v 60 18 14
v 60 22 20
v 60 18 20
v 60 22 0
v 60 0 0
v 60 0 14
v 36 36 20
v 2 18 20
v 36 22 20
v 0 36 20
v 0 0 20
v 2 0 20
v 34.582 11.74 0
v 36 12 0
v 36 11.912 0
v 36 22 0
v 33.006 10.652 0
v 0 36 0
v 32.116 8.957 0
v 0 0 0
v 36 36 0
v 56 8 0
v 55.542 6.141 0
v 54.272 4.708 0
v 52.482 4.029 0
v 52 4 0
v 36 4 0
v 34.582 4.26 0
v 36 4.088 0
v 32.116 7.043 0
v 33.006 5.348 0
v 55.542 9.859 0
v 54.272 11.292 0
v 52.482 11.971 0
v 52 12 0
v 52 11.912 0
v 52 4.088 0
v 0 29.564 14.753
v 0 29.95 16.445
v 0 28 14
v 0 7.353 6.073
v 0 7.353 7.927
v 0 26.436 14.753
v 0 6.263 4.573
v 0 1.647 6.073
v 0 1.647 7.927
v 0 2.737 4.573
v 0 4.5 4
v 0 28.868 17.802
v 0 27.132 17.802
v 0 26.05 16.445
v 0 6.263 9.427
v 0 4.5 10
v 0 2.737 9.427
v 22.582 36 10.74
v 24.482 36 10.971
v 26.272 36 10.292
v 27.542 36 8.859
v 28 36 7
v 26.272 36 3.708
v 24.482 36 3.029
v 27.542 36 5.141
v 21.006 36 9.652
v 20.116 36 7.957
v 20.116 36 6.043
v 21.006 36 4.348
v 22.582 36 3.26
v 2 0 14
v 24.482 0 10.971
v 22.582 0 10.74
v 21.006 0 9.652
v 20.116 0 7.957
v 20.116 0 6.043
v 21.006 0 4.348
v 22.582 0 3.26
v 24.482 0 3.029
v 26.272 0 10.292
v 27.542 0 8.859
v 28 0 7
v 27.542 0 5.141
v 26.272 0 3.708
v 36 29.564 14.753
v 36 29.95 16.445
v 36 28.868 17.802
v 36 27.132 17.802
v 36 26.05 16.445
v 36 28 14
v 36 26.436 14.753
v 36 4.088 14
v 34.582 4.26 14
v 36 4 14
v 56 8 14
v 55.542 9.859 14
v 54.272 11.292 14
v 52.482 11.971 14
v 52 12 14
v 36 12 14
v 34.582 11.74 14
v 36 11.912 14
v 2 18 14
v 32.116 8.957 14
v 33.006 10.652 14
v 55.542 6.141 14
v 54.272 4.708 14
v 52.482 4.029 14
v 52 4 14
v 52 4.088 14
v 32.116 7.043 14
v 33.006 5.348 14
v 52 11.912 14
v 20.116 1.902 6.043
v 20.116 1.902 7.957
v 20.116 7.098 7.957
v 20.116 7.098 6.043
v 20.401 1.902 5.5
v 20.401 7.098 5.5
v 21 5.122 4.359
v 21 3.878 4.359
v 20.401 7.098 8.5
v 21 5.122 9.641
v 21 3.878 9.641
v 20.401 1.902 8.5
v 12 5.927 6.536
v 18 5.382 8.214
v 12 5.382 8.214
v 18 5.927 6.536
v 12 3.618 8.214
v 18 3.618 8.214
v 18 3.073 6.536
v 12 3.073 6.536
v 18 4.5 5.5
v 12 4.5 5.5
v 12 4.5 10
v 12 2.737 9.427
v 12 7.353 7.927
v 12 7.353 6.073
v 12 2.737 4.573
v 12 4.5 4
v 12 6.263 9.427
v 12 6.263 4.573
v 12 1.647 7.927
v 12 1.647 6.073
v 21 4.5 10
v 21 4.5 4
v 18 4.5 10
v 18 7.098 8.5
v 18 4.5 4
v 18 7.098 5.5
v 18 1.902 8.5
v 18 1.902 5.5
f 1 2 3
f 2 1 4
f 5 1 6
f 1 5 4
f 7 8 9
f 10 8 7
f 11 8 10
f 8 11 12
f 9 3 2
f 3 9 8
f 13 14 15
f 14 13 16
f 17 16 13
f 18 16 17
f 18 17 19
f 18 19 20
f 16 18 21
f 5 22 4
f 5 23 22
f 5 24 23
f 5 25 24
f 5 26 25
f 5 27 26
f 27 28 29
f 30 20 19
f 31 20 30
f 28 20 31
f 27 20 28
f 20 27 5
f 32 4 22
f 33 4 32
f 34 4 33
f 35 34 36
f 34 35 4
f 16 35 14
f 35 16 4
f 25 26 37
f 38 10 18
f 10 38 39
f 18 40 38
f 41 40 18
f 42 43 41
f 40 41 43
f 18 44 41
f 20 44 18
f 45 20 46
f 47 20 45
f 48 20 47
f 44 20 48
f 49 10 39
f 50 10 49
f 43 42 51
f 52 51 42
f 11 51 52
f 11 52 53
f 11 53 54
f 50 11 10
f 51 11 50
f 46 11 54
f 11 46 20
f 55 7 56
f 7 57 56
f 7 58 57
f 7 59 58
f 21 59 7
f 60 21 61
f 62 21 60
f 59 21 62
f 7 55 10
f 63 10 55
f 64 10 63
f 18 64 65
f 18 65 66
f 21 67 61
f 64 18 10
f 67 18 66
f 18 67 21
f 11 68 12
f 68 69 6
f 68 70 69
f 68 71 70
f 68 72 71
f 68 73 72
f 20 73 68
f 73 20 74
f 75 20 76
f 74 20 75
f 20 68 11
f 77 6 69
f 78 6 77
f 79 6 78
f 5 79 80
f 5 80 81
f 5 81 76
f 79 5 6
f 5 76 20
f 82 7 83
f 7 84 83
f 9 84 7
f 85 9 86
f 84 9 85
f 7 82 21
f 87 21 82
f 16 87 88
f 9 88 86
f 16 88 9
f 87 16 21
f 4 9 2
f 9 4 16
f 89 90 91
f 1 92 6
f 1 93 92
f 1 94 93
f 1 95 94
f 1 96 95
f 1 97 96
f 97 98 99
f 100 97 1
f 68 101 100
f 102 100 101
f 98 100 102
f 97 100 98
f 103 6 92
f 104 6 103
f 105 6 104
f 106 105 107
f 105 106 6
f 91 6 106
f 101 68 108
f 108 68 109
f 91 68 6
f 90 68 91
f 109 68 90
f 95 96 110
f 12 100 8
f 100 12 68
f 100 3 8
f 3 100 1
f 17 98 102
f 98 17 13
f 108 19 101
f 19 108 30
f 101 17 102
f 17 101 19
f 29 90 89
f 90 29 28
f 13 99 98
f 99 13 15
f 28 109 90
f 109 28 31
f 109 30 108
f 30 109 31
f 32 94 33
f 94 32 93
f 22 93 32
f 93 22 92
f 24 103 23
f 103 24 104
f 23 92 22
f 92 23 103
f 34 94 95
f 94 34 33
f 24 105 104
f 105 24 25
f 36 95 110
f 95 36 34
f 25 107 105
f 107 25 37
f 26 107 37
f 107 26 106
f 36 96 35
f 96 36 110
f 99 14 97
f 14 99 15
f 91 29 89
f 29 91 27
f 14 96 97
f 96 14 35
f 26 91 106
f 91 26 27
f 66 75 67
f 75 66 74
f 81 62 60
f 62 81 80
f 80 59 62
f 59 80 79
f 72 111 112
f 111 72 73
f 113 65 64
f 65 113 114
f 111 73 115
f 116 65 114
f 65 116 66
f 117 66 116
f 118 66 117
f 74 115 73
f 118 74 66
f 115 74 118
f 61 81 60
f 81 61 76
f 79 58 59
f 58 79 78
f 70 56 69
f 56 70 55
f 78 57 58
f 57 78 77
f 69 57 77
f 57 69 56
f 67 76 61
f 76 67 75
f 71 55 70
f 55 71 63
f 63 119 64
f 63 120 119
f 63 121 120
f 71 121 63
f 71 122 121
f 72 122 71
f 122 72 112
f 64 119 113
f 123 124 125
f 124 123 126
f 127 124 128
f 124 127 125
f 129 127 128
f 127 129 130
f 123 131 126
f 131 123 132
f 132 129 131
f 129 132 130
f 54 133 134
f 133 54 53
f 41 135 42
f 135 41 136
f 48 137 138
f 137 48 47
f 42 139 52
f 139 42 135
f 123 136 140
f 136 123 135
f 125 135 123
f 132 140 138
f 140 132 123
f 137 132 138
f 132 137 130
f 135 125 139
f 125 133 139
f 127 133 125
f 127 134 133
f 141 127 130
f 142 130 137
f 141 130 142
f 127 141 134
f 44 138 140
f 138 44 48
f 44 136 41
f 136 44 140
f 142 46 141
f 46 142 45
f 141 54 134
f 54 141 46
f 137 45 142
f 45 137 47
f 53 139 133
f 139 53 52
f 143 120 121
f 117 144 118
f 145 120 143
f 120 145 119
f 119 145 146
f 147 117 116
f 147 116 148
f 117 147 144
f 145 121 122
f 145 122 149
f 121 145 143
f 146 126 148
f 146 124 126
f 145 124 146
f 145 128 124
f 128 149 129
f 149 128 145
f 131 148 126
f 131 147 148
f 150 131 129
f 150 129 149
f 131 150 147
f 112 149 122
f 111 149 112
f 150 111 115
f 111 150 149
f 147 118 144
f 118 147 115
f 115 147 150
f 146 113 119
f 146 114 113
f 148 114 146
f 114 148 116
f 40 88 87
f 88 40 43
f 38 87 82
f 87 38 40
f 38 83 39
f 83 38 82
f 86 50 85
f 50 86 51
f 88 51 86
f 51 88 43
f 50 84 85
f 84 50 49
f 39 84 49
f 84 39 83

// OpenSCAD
// file: configuration.scad
// Copyright (C) 2012 t00tie
// Adapto is licensed under the Creative Commons - GNU GPL license.
// http://creativecommons.org/licenses/GPL/2.0/

// Configuration file for Adapto OpenSCAD files

boltOuterRadius=5/2;// outer radius of bolt threads, 5 for M5 bolts
boltLength=60;//bolt length without head (threaded part only)
washerOuterRadius=13/2;// washers that fit the bolts
washerLength=10;// this is large because it is used to make holes for washers

frameX=20;// width of frame parts (alu, wood etc.)
frameY=20;// ditto

boltOffset=frameX/2;// How far in the bolt holes go, may need tweaking if framX!=frameY

smoothRod=8;// diameter of smooth rods
// file: bolt.scad
include <configuration.scad>;

module bolt(){
	union(){
		translate([0, 0, -boltLength]) cylinder(r=boltOuterRadius, h=boltLength+1);
		cylinder(r=washerOuterRadius, h=washerLength);
	}
}

// a bolt and washer intended for making equivalent holes
// the parameter from indicates which side the bolt is inserted from
module boltWasher(from="x-"){
	if(from=="x+"){
		rotate([0, 90, 0]) bolt();
	} else
	if(from=="x-"){
		rotate([0, -90, 0]) bolt();
	} else
	if(from=="y+"){
		rotate([-90, 0, 0]) bolt();
	} else
	if(from=="y-"){
		rotate([90, 0, 0]) bolt();
	} else
	if(from=="z+"){
		rotate([0, 0, 0]) bolt();
	} else
	if(from=="z-"){
		rotate([180, 0, 0]) bolt();
	}
}

boltWasher("x-");
// main file
// Copyright (C) 2012 t00tie
// After an stl designed by RoTorIT
// Adapto is licensed under the Creative Commons - GNU GPL license.
// http://creativecommons.org/licenses/GPL/2.0/

use <bolt.scad>;
include <configuration.scad>;

length=60;
lowerHeight=14;
thinWidth=22;
shortLength=36;
height=20;
width=36;
wallWidth=2;
bhBolt=8;// width of the bearing holder bolt elongated hole
srXoffset=20;// smooth rod X offset
srZoffset=3;// smooth rod Z offset
srSetScrew=3;// diameter of the smooth rod set screw
sSHead=6;// set screw head diameter
sSHH=12;// set screw head height
cHole=4;// X carriage fastener hole diameter
cHXoffset=26;// X carriage fastener hole X offset
cHZoffset=14;// X carriage fastener hole Z offset

difference(){
	// main body
	cube([length, width, height]);
	translate([shortLength, thinWidth, -1]) cube([length+2, width+2, height+2]);
	translate([wallWidth, -1,lowerHeight]) cube([length+2, thinWidth-wallWidth-1, height]);
	// bearing holder hole
	translate([shortLength, bhBolt, -1]) cylinder(r=bhBolt/2, h=lowerHeight+2);
	translate([length-8, bhBolt, -1]) cylinder(r=bhBolt/2, h=lowerHeight+2);
	translate([shortLength, bhBolt/2, -1]) cube([length-8-shortLength, 8, lowerHeight+2]);
	// smooth rod hole
	// future: should use real length smooth rod
	translate([srXoffset+smoothRod/2, -1, srZoffset+smoothRod/2]) rotate([-90, 0, 0]) cylinder(r=smoothRod/2, h=width+2);
	// smooth rod set screw hole and countersink
	translate([-1, srZoffset+srSetScrew/2, srZoffset+smoothRod/2]) rotate([0, 90, 0]) cylinder(r=srSetScrew/2, h=srXoffset+2);
	translate([-1, srZoffset+srSetScrew/2, srZoffset+smoothRod/2]) rotate([0, 90, 0]) cylinder(r=sSHead/2, h=sSHH+1);
	// smooth rod set screw captive m3 nut hole - needs to use common module
	translate([srXoffset-2, srZoffset+srSetScrew/2, srZoffset+smoothRod/2]) rotate([0, 90, 0]) cylinder(r=6/2, h=3, $fn=6);
	// X carriage fastener hole
	translate([-1, cHXoffset+cHole/2, cHZoffset+cHole/2]) rotate([0, 90, 0]) cylinder(r=cHole/2, h=shortLength+2);


}
